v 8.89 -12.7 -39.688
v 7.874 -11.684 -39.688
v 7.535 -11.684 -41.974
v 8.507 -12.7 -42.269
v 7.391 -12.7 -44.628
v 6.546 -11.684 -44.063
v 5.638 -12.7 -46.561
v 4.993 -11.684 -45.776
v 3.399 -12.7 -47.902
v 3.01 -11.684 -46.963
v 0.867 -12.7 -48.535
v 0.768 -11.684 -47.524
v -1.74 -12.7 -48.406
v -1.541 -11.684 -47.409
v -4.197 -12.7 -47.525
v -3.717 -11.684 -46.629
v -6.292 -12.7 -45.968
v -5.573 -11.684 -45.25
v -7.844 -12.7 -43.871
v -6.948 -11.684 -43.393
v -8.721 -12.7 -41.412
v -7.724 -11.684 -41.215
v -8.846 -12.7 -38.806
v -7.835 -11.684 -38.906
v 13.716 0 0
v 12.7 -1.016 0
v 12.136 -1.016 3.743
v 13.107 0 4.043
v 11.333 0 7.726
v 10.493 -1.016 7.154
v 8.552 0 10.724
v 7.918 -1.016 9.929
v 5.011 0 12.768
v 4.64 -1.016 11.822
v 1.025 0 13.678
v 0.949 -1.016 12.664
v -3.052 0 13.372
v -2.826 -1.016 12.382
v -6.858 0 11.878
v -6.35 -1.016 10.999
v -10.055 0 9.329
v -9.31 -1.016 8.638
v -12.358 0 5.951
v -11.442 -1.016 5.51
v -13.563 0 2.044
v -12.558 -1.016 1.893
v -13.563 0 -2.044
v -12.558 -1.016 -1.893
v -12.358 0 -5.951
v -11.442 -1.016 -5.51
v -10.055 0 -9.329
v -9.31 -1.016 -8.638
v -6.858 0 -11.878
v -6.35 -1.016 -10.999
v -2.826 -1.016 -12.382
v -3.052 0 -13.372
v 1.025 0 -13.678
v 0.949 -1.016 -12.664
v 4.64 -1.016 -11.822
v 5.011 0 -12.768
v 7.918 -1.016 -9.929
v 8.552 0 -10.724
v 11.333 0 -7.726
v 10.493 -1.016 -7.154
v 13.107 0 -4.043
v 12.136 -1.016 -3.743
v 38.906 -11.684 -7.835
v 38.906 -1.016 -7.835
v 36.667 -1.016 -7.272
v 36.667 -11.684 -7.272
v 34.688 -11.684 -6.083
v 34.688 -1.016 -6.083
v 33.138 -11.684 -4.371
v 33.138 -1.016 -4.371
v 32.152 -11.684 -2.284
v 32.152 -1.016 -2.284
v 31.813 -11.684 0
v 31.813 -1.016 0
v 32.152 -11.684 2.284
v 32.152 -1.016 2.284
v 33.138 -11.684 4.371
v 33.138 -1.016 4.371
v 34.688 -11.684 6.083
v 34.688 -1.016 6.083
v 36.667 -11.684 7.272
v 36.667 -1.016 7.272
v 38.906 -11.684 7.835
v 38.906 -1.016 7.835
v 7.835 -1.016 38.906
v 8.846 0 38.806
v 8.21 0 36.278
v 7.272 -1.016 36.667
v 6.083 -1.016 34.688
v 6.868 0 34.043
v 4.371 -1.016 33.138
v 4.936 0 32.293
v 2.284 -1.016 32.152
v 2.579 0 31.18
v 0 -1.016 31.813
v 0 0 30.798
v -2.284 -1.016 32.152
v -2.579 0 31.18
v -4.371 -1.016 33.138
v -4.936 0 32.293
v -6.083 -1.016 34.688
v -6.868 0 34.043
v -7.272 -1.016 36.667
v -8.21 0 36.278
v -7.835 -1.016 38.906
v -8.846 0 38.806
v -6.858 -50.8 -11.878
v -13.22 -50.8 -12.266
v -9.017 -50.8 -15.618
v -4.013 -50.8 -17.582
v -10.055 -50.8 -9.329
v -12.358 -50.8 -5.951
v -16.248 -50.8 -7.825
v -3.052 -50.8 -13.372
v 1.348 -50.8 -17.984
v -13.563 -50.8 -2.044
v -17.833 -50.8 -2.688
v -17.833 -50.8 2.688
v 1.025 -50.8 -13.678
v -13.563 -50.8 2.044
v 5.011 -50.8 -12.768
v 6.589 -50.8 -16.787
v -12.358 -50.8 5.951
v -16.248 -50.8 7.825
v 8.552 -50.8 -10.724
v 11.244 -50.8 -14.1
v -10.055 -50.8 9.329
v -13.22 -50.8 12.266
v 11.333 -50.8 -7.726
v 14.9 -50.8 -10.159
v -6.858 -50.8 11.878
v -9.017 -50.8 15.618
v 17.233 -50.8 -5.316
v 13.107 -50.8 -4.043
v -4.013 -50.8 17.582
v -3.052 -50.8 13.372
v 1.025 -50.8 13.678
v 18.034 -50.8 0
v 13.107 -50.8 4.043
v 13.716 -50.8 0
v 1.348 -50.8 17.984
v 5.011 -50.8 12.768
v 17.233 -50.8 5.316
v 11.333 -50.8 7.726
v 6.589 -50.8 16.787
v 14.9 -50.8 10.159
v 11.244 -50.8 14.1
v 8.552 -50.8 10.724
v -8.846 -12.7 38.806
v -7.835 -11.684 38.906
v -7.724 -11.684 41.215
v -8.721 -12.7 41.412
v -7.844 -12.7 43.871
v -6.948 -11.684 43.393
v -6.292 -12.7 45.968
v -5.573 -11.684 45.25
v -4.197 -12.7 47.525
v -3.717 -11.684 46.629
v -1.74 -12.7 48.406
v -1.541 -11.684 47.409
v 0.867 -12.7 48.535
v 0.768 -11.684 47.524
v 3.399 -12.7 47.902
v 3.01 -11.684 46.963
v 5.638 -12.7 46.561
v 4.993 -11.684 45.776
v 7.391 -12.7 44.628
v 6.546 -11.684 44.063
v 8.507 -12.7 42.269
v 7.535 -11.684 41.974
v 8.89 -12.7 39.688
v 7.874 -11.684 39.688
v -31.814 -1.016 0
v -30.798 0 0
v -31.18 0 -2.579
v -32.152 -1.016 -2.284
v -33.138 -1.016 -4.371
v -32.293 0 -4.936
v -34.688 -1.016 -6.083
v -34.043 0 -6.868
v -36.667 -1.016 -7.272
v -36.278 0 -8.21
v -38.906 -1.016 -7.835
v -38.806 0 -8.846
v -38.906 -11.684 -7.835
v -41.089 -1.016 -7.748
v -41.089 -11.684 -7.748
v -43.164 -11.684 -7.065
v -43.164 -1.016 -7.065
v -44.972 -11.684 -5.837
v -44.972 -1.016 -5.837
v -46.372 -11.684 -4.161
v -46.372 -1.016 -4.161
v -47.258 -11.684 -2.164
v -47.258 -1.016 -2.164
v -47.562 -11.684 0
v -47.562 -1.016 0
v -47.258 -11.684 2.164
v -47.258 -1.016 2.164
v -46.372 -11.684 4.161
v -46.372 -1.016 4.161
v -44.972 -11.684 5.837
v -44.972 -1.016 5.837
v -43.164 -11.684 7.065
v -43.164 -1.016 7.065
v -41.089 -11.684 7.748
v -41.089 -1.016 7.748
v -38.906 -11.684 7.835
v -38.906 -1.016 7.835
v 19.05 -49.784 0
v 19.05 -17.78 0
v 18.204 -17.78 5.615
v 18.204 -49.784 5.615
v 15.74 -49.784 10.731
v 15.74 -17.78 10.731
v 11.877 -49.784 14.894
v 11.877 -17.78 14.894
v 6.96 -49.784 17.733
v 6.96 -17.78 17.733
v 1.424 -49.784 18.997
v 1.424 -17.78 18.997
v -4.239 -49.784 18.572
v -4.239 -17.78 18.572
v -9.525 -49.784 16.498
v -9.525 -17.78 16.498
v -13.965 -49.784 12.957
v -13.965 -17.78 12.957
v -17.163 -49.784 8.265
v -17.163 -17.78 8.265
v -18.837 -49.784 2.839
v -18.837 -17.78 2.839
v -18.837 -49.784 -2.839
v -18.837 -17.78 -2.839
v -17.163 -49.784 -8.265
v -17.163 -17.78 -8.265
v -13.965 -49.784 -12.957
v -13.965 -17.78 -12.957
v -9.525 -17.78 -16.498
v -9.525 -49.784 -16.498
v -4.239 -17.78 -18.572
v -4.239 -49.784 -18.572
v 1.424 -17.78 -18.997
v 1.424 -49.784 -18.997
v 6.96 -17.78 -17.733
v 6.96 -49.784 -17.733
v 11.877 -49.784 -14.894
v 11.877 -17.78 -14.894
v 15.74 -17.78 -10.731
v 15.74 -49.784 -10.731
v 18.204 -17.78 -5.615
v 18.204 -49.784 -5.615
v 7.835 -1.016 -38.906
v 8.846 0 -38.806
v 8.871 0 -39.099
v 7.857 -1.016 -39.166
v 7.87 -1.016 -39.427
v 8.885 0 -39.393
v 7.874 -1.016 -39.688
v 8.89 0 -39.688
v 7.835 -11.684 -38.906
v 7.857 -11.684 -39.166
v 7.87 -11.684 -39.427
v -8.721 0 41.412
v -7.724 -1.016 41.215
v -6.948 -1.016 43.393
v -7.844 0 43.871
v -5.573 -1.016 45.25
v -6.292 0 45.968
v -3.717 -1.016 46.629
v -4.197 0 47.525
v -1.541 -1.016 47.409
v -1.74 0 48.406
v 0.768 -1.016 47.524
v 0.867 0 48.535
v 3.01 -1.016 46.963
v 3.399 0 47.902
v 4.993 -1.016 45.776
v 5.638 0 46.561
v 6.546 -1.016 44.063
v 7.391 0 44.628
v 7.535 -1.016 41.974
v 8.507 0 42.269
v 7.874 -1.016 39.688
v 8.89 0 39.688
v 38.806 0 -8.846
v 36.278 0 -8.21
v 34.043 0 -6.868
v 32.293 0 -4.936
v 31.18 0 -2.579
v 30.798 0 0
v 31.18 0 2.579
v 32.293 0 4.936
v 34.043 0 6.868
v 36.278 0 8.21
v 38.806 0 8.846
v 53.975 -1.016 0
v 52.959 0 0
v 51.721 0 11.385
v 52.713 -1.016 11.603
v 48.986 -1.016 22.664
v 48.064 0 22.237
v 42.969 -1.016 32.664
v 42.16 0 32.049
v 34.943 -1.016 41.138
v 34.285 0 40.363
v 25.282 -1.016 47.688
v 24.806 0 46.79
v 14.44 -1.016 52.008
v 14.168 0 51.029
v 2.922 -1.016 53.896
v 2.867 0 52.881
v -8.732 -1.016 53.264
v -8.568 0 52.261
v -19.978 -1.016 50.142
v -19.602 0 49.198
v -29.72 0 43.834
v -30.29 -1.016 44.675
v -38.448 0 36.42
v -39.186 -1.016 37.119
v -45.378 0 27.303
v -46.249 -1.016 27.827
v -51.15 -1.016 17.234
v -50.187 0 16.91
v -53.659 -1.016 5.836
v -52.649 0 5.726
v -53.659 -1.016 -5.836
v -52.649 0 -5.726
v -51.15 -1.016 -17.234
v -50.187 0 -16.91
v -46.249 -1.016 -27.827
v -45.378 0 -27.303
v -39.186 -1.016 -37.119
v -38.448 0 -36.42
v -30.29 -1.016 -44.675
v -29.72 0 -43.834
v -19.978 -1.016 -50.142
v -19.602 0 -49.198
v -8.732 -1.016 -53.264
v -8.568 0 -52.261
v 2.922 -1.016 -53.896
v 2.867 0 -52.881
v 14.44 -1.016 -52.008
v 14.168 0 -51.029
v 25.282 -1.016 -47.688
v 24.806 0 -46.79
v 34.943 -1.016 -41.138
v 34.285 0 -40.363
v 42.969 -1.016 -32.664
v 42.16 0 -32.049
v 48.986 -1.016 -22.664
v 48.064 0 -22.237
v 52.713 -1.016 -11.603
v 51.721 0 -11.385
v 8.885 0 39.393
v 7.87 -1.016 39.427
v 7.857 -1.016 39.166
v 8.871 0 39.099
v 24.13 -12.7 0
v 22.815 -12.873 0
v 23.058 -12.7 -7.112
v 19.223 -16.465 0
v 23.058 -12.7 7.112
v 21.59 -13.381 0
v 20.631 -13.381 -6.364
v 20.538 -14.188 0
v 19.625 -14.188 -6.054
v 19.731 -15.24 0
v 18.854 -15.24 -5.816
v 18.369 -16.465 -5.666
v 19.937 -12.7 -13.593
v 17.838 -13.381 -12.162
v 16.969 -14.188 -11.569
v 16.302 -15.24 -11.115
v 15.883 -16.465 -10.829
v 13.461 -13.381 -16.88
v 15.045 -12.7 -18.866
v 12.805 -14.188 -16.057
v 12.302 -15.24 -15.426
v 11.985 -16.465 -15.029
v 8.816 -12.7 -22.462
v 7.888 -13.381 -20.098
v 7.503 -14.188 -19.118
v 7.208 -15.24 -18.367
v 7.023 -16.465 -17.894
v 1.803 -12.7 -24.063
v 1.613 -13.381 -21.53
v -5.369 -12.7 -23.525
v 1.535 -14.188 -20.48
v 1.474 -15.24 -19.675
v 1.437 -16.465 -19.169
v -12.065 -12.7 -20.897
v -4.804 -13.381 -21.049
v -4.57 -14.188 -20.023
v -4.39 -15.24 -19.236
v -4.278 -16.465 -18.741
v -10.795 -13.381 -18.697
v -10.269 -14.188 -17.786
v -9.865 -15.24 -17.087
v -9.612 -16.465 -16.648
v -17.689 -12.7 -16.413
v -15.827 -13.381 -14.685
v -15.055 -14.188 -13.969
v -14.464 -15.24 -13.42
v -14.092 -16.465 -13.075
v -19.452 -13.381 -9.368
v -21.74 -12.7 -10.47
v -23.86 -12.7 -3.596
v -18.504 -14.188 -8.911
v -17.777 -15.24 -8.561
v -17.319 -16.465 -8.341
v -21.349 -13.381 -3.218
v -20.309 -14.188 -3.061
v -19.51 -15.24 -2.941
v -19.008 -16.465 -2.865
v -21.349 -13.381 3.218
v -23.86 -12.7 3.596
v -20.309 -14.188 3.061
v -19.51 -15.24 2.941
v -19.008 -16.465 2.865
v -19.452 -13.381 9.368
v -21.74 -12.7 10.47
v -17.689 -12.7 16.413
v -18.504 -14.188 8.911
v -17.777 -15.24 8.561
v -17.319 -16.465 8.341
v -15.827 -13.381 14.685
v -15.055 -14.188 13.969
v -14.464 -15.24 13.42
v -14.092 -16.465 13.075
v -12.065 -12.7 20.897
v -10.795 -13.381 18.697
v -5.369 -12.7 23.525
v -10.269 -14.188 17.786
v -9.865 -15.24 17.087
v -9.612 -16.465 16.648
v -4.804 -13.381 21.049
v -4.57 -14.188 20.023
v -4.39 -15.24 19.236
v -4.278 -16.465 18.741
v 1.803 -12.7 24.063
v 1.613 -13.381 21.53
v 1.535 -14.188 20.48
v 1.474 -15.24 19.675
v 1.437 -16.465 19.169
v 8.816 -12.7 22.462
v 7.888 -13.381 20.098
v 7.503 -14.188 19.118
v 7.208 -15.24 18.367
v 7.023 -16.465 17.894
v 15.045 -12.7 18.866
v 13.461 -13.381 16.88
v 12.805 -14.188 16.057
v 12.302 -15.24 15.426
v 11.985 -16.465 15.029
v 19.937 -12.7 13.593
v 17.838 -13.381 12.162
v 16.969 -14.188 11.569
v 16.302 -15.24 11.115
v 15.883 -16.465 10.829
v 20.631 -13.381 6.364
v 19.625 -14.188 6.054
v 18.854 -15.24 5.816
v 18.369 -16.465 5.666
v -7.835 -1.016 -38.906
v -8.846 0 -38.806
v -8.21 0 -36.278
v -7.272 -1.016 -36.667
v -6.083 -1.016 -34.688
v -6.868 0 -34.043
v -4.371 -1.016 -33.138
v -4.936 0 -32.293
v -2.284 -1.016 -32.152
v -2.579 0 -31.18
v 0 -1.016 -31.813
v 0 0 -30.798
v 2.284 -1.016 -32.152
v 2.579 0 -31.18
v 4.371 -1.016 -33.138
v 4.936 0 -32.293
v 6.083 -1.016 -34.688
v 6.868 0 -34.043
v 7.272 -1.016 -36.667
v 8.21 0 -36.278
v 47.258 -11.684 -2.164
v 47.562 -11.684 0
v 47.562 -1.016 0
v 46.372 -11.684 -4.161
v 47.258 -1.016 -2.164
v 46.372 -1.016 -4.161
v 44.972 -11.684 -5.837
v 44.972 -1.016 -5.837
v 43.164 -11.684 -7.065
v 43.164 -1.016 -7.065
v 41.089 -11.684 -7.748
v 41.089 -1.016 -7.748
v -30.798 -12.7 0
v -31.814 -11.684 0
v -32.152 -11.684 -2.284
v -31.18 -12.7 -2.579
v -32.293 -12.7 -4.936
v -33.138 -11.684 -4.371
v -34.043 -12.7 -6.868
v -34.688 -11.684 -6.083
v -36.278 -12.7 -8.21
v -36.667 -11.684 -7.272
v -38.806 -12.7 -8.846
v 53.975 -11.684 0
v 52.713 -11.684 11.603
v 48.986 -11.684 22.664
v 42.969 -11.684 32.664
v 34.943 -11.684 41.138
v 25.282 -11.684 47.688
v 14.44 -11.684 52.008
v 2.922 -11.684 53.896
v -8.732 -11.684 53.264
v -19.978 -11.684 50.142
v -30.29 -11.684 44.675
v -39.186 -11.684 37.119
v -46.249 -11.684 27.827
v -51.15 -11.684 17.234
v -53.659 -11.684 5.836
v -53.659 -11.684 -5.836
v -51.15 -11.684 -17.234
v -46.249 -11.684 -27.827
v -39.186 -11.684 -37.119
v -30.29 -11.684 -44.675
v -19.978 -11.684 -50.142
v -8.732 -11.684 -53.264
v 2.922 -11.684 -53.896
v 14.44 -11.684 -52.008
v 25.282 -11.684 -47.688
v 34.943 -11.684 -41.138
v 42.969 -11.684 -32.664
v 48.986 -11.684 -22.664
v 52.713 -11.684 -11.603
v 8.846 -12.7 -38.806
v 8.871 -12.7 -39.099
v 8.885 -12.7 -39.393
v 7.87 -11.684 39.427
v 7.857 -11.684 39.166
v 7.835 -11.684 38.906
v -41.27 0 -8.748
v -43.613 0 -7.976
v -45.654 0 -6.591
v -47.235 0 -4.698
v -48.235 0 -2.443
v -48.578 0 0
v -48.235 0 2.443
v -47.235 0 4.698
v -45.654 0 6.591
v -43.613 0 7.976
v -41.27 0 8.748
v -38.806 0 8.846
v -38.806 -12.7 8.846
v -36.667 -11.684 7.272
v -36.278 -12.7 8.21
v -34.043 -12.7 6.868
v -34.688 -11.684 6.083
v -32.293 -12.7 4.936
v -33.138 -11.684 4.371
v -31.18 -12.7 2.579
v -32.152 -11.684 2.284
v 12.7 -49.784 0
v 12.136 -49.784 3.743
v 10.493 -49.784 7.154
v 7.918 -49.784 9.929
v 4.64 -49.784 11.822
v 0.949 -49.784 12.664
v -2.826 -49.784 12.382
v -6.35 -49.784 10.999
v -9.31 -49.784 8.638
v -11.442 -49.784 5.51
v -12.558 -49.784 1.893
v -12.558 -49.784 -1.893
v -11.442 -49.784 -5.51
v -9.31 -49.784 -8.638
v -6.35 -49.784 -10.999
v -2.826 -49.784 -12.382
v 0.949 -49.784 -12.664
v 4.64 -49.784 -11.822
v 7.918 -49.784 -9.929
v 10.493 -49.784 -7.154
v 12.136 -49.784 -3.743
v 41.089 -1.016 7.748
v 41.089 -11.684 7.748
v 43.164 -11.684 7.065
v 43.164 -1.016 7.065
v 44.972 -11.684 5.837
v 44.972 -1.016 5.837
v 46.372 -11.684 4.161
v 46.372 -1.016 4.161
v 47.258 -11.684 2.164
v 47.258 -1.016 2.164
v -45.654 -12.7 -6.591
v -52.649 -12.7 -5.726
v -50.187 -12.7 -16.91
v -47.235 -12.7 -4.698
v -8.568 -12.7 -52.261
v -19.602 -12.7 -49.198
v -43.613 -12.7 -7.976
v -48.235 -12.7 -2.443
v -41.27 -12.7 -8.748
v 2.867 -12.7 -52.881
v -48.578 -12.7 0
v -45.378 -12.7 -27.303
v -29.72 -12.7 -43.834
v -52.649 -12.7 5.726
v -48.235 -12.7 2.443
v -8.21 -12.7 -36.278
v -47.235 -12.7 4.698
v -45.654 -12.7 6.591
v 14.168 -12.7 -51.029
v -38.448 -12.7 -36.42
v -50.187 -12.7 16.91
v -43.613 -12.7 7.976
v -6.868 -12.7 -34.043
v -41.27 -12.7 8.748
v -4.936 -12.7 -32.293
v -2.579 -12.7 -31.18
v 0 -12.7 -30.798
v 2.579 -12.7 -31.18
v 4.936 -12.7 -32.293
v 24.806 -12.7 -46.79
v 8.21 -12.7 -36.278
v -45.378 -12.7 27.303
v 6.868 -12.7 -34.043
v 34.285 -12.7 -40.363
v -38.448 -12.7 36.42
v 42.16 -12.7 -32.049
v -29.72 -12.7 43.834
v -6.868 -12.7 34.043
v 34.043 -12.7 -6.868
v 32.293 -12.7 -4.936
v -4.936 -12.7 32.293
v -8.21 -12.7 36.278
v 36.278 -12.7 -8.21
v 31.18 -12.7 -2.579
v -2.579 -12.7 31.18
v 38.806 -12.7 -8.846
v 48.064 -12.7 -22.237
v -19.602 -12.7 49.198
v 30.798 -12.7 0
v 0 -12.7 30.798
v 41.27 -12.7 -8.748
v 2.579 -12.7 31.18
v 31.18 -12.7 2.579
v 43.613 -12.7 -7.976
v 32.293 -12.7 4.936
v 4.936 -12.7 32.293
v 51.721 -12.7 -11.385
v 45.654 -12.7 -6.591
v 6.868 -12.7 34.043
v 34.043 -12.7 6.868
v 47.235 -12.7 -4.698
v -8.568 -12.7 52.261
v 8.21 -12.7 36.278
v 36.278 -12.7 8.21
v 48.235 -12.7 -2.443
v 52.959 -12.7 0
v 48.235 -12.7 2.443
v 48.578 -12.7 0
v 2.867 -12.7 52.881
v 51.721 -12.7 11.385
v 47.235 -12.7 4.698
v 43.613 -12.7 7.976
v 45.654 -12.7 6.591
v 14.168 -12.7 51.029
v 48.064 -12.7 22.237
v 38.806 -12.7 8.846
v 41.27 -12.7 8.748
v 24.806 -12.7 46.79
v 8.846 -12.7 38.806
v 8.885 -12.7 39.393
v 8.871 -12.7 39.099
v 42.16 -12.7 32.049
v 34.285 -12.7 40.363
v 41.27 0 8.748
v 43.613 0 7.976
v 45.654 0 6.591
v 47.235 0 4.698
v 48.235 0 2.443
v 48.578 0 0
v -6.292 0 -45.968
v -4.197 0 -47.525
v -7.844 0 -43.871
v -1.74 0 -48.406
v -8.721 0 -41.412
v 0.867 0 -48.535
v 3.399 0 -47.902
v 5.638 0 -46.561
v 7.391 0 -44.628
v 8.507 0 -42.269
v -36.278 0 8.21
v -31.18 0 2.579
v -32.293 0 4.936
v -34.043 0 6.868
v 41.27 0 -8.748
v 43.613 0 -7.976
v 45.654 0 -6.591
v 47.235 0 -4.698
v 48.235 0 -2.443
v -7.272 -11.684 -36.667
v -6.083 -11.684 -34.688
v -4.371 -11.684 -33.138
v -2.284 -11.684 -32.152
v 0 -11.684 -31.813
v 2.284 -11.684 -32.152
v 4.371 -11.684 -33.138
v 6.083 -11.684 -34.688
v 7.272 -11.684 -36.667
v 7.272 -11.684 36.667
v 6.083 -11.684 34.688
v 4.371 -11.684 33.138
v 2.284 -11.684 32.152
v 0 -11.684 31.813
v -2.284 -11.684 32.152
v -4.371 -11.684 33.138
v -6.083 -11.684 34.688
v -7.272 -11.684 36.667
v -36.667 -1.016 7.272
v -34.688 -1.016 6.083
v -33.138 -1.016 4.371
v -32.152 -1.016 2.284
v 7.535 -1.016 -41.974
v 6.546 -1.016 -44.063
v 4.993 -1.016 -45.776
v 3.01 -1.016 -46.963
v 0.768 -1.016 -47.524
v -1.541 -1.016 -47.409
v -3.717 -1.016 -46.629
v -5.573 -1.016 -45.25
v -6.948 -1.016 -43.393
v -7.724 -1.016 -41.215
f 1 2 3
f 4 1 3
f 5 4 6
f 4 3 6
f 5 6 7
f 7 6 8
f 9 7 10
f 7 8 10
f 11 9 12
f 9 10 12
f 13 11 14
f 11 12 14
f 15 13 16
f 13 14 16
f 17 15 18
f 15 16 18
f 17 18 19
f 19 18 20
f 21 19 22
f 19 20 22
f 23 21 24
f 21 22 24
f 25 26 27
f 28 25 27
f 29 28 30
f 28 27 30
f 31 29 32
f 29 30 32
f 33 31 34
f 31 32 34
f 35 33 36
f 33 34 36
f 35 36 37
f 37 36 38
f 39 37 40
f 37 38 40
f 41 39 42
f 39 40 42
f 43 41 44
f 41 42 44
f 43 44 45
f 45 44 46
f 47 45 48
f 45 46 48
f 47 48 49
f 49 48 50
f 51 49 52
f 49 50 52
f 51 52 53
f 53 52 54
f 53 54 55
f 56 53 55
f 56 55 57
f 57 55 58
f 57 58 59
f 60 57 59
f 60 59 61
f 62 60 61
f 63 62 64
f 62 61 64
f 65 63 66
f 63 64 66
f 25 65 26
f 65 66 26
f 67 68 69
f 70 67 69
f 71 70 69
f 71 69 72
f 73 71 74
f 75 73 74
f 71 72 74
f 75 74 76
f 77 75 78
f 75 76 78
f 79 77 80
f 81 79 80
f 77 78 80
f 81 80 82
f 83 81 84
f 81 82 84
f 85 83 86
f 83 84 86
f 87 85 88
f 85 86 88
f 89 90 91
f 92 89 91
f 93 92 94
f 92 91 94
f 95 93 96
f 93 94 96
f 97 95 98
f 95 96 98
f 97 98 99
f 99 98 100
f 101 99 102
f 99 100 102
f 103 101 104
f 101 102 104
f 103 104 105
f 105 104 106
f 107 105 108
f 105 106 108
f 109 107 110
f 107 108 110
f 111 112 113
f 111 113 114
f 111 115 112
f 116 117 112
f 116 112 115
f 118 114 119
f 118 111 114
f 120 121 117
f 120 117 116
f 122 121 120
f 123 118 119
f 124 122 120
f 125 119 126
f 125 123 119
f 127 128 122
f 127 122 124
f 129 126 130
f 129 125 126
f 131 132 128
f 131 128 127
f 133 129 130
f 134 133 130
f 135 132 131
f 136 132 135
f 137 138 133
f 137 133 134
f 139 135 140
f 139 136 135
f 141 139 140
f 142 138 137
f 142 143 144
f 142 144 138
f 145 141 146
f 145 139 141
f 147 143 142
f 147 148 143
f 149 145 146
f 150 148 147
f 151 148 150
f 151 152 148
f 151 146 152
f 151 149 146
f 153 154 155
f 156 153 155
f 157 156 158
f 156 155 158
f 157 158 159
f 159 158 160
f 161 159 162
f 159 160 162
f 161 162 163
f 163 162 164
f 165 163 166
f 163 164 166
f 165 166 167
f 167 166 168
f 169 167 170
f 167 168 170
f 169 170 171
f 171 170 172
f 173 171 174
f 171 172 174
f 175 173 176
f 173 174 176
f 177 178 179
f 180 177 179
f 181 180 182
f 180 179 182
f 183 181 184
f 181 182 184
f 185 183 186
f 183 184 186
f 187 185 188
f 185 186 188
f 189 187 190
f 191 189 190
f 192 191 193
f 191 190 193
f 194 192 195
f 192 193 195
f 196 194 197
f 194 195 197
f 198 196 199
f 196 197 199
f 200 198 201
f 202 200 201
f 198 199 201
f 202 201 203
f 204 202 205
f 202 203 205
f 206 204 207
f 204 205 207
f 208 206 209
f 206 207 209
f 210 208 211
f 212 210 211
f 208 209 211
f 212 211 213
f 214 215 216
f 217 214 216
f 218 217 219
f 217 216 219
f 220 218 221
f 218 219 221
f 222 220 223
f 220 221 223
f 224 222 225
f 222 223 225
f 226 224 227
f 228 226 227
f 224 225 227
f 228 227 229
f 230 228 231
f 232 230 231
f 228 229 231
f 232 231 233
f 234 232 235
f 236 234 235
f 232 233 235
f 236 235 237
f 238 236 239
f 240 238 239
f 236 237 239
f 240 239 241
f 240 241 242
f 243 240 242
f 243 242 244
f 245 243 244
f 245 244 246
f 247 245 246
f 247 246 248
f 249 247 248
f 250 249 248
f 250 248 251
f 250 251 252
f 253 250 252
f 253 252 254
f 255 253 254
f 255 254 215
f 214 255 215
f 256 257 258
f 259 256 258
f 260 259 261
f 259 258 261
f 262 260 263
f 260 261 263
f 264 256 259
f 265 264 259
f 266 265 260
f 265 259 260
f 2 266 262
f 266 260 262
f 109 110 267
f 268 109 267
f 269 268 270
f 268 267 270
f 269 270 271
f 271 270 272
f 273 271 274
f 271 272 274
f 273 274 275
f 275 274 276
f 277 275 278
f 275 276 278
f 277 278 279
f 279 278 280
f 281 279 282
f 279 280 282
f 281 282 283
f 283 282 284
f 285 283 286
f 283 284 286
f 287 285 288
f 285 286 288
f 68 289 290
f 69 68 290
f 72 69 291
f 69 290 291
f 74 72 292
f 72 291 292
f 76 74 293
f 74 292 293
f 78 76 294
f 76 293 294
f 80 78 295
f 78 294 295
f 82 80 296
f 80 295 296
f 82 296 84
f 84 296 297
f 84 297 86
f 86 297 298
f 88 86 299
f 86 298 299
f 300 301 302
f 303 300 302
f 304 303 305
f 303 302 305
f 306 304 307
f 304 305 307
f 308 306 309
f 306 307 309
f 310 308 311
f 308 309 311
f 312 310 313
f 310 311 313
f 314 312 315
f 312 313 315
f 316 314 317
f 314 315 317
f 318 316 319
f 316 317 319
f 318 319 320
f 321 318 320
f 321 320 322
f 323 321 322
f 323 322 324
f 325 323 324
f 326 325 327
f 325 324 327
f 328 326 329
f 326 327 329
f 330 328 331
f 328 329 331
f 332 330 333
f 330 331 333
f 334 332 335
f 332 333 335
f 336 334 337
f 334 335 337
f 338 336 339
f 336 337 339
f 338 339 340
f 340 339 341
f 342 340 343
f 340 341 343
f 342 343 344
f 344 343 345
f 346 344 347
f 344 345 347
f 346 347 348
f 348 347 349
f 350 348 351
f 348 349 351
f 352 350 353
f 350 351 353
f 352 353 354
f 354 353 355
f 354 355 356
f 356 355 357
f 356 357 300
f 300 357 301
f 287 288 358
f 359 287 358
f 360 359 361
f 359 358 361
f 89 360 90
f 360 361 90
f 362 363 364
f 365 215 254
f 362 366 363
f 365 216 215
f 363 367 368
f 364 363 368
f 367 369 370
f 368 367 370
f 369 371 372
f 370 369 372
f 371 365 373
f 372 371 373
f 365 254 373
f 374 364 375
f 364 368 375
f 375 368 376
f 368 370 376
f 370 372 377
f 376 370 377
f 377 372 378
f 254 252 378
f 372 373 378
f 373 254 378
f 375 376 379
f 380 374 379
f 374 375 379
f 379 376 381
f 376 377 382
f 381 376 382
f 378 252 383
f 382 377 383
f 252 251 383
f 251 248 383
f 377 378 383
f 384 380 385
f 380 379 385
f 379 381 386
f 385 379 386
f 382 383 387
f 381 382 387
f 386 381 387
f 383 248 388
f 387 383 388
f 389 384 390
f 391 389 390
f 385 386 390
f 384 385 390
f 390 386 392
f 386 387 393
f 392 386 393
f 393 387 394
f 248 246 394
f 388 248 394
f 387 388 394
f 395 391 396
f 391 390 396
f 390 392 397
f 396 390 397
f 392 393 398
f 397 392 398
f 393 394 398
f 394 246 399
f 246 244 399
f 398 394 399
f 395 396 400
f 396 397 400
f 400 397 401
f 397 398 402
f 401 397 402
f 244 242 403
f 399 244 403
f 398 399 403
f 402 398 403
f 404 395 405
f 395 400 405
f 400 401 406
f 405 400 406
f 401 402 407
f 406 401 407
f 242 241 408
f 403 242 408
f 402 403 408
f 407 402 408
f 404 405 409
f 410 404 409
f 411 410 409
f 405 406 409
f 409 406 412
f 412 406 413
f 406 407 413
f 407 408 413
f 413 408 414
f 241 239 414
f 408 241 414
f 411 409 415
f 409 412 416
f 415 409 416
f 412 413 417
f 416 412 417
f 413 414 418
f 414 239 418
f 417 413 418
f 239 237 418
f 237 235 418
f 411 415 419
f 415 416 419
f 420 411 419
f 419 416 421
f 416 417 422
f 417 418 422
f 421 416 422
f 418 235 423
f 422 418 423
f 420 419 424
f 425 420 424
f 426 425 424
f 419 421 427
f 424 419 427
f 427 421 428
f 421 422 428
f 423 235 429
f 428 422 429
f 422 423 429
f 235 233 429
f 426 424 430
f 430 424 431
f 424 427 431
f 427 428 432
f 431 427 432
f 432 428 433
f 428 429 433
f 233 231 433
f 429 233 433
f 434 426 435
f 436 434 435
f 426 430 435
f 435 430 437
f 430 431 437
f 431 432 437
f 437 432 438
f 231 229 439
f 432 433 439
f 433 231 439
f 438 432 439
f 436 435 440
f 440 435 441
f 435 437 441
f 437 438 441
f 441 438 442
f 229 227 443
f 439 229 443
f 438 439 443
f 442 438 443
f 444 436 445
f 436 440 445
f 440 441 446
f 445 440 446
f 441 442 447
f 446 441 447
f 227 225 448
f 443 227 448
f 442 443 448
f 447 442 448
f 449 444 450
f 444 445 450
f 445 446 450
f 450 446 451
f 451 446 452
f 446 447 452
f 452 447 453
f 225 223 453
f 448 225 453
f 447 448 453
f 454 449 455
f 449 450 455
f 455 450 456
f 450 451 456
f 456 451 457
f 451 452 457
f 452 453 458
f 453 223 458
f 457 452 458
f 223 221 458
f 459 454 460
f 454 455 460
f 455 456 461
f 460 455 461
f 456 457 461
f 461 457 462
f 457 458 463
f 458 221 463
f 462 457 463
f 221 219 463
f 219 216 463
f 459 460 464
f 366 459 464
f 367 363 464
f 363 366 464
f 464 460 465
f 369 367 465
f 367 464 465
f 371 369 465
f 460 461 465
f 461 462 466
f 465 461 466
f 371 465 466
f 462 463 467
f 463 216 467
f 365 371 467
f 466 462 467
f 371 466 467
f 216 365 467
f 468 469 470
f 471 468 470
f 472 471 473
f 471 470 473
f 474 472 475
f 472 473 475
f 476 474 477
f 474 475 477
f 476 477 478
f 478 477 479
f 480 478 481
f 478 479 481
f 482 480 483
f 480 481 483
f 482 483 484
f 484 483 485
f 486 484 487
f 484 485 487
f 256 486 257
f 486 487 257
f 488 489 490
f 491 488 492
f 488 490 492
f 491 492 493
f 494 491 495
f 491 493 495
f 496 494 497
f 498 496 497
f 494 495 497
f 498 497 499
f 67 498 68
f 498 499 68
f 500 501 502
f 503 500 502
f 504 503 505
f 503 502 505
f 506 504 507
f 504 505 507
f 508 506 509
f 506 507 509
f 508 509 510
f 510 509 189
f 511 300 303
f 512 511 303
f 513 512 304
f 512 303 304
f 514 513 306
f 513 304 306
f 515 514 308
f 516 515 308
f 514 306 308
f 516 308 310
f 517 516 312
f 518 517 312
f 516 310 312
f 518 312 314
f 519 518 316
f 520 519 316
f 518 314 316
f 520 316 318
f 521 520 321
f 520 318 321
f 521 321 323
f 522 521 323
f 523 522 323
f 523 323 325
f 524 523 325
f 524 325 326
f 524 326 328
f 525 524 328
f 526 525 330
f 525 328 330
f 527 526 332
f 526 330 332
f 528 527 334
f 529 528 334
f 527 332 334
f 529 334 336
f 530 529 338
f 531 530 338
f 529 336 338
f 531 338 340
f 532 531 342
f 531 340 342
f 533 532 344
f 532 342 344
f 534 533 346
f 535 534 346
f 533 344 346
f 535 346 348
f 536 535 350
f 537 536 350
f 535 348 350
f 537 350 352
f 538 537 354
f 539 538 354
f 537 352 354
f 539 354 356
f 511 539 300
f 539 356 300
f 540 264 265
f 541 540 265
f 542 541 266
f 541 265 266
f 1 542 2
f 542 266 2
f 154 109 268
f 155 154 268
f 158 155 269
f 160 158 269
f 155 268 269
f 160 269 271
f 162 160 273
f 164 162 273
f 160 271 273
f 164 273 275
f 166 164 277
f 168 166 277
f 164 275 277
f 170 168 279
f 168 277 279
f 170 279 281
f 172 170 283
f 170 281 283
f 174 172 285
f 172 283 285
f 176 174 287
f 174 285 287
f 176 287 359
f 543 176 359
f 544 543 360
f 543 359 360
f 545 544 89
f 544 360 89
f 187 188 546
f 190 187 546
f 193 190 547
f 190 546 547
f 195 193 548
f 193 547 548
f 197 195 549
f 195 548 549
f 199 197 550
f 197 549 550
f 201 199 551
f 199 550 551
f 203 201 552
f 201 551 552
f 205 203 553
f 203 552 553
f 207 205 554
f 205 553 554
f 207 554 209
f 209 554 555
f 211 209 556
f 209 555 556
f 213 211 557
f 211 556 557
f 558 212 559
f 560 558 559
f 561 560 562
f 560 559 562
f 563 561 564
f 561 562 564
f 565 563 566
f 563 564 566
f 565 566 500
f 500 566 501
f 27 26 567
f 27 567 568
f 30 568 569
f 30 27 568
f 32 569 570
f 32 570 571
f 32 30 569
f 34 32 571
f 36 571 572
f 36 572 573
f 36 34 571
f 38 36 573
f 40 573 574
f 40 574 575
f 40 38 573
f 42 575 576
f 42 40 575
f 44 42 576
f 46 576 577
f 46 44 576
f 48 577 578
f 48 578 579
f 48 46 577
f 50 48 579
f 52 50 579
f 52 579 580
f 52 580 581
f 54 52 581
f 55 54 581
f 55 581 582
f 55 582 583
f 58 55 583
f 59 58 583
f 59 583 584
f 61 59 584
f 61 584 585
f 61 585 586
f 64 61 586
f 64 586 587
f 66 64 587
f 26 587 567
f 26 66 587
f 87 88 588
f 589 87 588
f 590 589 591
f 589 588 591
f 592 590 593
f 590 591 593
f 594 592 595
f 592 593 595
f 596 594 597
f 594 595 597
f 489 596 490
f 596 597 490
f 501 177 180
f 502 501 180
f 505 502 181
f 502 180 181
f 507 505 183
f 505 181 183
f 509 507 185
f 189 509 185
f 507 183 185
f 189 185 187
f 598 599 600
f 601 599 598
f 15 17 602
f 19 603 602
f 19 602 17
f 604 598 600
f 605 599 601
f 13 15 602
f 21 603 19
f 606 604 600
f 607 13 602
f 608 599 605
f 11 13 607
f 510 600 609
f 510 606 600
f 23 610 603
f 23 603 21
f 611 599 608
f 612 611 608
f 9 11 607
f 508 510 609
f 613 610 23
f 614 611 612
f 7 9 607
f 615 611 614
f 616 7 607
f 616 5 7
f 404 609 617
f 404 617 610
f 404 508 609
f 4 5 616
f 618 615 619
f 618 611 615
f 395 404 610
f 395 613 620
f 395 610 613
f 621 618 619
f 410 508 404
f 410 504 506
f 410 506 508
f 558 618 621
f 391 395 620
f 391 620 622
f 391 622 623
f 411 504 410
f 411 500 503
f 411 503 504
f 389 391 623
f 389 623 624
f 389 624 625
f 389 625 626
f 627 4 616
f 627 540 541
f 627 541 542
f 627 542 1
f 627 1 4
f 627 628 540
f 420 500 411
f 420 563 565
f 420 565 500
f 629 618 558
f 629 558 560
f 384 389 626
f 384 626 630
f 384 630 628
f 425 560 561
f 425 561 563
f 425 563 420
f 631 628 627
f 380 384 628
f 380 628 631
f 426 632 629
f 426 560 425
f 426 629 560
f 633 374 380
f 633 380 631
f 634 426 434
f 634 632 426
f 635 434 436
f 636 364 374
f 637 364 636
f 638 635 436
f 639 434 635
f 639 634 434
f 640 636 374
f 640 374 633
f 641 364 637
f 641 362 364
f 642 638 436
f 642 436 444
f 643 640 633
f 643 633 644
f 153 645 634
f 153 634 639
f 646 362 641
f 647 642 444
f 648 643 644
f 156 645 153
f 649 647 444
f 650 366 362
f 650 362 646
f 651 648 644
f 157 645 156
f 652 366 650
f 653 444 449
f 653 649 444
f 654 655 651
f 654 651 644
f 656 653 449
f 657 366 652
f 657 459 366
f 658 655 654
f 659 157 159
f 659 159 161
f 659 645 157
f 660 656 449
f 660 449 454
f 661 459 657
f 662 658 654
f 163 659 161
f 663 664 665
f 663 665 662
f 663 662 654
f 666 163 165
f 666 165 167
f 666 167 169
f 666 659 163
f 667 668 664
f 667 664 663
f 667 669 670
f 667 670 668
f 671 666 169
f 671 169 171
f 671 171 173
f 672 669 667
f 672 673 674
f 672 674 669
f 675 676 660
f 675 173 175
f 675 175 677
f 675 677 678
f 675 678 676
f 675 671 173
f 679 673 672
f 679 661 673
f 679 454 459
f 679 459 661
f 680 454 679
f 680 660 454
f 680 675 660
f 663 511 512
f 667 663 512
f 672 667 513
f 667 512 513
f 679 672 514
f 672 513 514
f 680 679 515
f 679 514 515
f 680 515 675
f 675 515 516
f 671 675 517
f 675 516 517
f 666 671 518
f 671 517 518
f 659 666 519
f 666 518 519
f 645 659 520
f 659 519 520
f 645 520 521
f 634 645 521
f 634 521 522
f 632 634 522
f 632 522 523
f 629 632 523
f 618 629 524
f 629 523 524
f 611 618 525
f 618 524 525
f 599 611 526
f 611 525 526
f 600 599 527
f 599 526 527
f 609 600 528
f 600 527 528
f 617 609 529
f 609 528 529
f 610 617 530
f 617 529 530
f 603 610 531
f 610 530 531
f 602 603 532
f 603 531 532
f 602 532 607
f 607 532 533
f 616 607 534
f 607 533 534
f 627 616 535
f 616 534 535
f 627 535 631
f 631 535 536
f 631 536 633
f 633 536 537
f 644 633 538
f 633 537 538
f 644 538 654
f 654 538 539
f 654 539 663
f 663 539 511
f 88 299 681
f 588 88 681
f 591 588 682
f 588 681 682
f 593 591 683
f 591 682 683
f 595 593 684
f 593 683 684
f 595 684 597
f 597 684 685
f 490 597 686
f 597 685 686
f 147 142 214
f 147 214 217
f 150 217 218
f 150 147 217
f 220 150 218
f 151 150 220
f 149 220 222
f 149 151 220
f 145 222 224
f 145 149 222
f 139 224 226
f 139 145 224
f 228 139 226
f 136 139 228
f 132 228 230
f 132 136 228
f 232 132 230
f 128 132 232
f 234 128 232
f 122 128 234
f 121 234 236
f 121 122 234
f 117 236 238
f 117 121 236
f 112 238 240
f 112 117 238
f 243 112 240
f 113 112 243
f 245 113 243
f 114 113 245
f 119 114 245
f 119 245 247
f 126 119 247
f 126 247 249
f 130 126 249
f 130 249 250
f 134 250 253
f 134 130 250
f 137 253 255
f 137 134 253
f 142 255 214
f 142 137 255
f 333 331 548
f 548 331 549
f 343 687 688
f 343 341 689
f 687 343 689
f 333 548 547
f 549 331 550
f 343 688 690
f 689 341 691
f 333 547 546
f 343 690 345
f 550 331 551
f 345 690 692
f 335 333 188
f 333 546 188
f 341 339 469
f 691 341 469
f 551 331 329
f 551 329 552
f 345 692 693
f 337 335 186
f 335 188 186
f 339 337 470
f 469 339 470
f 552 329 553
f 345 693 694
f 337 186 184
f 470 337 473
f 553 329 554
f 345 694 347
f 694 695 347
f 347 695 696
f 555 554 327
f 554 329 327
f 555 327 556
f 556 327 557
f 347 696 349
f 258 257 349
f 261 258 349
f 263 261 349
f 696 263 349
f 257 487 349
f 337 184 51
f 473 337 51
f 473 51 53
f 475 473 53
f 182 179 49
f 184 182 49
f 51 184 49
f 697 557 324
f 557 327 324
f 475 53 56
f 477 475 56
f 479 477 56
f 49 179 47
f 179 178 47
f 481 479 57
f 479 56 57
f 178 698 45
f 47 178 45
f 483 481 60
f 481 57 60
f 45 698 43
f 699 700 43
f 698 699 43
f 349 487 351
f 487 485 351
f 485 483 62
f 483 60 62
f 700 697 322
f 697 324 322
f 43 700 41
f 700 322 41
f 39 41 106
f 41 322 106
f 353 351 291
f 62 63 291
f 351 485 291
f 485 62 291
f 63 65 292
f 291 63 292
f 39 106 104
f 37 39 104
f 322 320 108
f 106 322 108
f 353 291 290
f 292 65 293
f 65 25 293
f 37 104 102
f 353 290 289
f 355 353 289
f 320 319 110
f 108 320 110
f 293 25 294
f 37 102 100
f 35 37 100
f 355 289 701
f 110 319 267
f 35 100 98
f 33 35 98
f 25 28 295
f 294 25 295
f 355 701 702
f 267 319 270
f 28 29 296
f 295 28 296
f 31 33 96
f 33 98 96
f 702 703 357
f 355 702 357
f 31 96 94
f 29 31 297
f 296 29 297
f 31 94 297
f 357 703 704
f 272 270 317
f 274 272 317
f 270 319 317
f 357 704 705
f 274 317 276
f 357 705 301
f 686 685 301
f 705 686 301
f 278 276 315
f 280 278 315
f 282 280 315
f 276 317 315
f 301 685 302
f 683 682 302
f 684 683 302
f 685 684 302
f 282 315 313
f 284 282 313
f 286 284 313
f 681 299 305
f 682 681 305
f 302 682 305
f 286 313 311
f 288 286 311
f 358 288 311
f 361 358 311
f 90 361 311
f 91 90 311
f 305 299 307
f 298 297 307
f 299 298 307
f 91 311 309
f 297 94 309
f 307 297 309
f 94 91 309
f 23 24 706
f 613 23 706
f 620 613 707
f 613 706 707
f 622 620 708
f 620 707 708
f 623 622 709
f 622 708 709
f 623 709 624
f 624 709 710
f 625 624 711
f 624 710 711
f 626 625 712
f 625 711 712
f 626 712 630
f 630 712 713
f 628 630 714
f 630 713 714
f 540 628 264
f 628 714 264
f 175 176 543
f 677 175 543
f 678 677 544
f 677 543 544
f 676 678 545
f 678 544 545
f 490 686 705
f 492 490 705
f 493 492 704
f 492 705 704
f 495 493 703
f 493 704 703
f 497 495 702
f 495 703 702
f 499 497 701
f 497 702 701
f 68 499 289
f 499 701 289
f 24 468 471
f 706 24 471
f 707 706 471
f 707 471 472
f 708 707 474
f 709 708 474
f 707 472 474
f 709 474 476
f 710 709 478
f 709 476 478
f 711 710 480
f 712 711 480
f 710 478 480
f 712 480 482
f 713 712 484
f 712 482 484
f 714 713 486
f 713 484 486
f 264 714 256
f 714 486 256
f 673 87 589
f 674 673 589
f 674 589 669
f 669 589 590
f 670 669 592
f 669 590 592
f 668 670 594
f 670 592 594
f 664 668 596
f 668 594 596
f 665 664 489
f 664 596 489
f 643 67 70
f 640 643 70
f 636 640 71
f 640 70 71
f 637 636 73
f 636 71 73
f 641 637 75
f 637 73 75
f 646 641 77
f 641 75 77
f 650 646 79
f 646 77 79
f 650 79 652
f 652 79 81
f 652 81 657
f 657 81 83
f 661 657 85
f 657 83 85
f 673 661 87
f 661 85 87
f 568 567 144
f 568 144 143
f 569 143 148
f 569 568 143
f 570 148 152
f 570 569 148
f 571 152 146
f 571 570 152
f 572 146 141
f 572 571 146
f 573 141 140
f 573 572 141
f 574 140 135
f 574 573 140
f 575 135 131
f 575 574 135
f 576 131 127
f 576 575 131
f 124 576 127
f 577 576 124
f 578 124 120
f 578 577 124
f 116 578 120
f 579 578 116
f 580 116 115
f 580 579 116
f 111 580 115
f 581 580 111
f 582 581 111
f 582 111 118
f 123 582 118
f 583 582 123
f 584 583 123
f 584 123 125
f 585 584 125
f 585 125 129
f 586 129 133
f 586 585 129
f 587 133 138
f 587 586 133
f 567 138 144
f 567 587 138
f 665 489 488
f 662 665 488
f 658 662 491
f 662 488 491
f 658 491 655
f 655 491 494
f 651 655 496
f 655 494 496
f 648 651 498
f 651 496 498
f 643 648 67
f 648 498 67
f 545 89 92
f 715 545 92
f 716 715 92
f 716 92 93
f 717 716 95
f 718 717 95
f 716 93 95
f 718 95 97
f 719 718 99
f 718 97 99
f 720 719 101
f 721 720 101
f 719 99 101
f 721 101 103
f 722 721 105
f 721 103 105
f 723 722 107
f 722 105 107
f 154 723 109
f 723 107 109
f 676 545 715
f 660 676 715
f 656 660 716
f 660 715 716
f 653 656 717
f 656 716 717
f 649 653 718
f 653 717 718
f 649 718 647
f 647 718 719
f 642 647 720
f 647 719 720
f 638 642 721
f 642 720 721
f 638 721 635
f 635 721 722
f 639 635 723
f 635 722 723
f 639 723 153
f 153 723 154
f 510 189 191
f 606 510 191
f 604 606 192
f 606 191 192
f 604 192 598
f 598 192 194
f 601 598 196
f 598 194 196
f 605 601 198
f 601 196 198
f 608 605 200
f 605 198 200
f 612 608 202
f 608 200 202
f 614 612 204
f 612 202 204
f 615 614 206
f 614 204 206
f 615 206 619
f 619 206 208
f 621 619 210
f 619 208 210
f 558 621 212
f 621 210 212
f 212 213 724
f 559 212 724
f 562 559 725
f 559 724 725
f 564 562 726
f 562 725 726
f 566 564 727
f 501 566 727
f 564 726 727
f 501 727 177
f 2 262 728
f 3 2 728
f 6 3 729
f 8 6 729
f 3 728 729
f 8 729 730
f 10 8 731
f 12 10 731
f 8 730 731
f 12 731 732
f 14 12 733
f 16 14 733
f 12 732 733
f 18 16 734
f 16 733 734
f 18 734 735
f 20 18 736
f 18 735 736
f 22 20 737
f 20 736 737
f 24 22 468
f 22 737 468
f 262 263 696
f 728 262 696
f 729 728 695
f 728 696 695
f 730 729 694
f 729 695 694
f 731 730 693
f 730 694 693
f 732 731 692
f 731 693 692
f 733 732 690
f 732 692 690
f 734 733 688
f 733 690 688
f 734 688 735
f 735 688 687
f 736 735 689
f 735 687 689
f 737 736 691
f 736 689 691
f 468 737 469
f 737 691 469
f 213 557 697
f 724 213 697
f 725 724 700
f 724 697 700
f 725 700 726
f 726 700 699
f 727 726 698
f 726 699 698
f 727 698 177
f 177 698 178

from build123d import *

# Parameters (mm, degrees)
F0_R     = 53.975
F0_R_2   = 19.05
F0_R_3   = 12.7
F1_DEPTH = 12.7
F2_DEPTH = 50.8
F3_R     = 5.08
F4_SIZE  = 1.016


with BuildPart() as f1:
    # F0 (on Front) → F1 (new body)
    with BuildSketch(Plane.XZ):
        Circle(F0_R)
        with BuildLine():
            ThreePointArc((7.835162, 38.906399), (28.0633, 28.0633), (38.906399, 7.835162))
            ThreePointArc((38.906399, 7.835162), (44.971887, 5.837391), (47.5615, 0))
            ThreePointArc((47.5615, 0), (44.971887, -5.837391), (38.906399, -7.835162))
            ThreePointArc((38.906399, -7.835162), (28.0633, -28.0633), (7.835162, -38.906399))
            ThreePointArc((7.835162, -38.906399), (7.864284, -39.296467), (7.874, -39.6875))
            ThreePointArc((7.874, -39.6875), (-0.391033, -47.551784), (-7.835162, -38.906399))
            ThreePointArc((-7.835162, -38.906399), (-28.0633, -28.0633), (-38.906399, -7.835162))
            ThreePointArc((-38.906399, -7.835162), (-47.5615, 0), (-38.906399, 7.835162))
            ThreePointArc((-38.906399, 7.835162), (-28.0633, 28.0633), (-7.835162, 38.906399))
            ThreePointArc((-7.835162, 38.906399), (-0.391033, 47.551784), (7.874, 39.6875))
            ThreePointArc((7.874, 39.6875), (7.864284, 39.296467), (7.835162, 38.906399))
        make_face(mode=Mode.SUBTRACT)
        with BuildLine():
            ThreePointArc((38.906399, -7.835162), (31.8135, 0), (38.906399, 7.835162))
            ThreePointArc((38.906399, 7.835162), (28.0633, 28.0633), (7.835162, 38.906399))
            ThreePointArc((7.835162, 38.906399), (0, 31.8135), (-7.835162, 38.906399))
            ThreePointArc((-7.835162, 38.906399), (-28.0633, 28.0633), (-38.906399, 7.835162))
            ThreePointArc((-38.906399, 7.835162), (-33.850109, 5.284387), (-31.8135, 0))
            ThreePointArc((-31.8135, 0), (-33.850109, -5.284387), (-38.906399, -7.835162))
            ThreePointArc((-38.906399, -7.835162), (-28.0633, -28.0633), (-7.835162, -38.906399))
            ThreePointArc((-7.835162, -38.906399), (0, -31.8135), (7.835162, -38.906399))
            ThreePointArc((7.835162, -38.906399), (28.0633, -28.0633), (38.906399, -7.835162))
        make_face()
        Circle(F0_R_2, mode=Mode.SUBTRACT)
        Circle(F0_R_2)
        Circle(F0_R_3, mode=Mode.SUBTRACT)
    extrude(amount=F1_DEPTH)

    # F0 (on Front) → F2 (join)
    with BuildSketch(Plane.XZ):
        Circle(F0_R_2)
        Circle(F0_R_3, mode=Mode.SUBTRACT)
    extrude(amount=F2_DEPTH)

    # F3
    f3_edges = [f1.edges().sort_by_distance(p)[0] for p in [
        (-19.05, -12.7, 0),
    ]]
    fillet(f3_edges, radius=F3_R)

    # F4
    f4_edges = [f1.edges().sort_by_distance(p)[0] for p in [
        (53.975, -6.35, 0),
        (-53.975, 0, 0),
        (-53.975, -12.7, 0),
        (-40.468601, 0, -7.835162),
        (-38.906399, -6.35, 7.835162),
        (-40.468601, -12.7, -7.835162),
        (-7.835162, -6.35, -38.906399),
        (7.835162, 0, -40.468601),
        (7.835162, -12.7, -40.468601),
        (38.906399, -6.35, -7.835162),
        (40.468601, 0, 7.835162),
        (40.468601, -12.7, 7.835162),
        (7.874, -6.35, 39.6875),
        (-7.874, 0, 39.6875),
        (-7.874, -12.7, 39.6875),
        (-19.05, -50.8, 0),
        (-12.7, 0, 0),
        (12.7, -25.4, 0),
        (-12.7, -50.8, 0),
    ]]
    chamfer(f4_edges, length=F4_SIZE)


solid = f1.part
